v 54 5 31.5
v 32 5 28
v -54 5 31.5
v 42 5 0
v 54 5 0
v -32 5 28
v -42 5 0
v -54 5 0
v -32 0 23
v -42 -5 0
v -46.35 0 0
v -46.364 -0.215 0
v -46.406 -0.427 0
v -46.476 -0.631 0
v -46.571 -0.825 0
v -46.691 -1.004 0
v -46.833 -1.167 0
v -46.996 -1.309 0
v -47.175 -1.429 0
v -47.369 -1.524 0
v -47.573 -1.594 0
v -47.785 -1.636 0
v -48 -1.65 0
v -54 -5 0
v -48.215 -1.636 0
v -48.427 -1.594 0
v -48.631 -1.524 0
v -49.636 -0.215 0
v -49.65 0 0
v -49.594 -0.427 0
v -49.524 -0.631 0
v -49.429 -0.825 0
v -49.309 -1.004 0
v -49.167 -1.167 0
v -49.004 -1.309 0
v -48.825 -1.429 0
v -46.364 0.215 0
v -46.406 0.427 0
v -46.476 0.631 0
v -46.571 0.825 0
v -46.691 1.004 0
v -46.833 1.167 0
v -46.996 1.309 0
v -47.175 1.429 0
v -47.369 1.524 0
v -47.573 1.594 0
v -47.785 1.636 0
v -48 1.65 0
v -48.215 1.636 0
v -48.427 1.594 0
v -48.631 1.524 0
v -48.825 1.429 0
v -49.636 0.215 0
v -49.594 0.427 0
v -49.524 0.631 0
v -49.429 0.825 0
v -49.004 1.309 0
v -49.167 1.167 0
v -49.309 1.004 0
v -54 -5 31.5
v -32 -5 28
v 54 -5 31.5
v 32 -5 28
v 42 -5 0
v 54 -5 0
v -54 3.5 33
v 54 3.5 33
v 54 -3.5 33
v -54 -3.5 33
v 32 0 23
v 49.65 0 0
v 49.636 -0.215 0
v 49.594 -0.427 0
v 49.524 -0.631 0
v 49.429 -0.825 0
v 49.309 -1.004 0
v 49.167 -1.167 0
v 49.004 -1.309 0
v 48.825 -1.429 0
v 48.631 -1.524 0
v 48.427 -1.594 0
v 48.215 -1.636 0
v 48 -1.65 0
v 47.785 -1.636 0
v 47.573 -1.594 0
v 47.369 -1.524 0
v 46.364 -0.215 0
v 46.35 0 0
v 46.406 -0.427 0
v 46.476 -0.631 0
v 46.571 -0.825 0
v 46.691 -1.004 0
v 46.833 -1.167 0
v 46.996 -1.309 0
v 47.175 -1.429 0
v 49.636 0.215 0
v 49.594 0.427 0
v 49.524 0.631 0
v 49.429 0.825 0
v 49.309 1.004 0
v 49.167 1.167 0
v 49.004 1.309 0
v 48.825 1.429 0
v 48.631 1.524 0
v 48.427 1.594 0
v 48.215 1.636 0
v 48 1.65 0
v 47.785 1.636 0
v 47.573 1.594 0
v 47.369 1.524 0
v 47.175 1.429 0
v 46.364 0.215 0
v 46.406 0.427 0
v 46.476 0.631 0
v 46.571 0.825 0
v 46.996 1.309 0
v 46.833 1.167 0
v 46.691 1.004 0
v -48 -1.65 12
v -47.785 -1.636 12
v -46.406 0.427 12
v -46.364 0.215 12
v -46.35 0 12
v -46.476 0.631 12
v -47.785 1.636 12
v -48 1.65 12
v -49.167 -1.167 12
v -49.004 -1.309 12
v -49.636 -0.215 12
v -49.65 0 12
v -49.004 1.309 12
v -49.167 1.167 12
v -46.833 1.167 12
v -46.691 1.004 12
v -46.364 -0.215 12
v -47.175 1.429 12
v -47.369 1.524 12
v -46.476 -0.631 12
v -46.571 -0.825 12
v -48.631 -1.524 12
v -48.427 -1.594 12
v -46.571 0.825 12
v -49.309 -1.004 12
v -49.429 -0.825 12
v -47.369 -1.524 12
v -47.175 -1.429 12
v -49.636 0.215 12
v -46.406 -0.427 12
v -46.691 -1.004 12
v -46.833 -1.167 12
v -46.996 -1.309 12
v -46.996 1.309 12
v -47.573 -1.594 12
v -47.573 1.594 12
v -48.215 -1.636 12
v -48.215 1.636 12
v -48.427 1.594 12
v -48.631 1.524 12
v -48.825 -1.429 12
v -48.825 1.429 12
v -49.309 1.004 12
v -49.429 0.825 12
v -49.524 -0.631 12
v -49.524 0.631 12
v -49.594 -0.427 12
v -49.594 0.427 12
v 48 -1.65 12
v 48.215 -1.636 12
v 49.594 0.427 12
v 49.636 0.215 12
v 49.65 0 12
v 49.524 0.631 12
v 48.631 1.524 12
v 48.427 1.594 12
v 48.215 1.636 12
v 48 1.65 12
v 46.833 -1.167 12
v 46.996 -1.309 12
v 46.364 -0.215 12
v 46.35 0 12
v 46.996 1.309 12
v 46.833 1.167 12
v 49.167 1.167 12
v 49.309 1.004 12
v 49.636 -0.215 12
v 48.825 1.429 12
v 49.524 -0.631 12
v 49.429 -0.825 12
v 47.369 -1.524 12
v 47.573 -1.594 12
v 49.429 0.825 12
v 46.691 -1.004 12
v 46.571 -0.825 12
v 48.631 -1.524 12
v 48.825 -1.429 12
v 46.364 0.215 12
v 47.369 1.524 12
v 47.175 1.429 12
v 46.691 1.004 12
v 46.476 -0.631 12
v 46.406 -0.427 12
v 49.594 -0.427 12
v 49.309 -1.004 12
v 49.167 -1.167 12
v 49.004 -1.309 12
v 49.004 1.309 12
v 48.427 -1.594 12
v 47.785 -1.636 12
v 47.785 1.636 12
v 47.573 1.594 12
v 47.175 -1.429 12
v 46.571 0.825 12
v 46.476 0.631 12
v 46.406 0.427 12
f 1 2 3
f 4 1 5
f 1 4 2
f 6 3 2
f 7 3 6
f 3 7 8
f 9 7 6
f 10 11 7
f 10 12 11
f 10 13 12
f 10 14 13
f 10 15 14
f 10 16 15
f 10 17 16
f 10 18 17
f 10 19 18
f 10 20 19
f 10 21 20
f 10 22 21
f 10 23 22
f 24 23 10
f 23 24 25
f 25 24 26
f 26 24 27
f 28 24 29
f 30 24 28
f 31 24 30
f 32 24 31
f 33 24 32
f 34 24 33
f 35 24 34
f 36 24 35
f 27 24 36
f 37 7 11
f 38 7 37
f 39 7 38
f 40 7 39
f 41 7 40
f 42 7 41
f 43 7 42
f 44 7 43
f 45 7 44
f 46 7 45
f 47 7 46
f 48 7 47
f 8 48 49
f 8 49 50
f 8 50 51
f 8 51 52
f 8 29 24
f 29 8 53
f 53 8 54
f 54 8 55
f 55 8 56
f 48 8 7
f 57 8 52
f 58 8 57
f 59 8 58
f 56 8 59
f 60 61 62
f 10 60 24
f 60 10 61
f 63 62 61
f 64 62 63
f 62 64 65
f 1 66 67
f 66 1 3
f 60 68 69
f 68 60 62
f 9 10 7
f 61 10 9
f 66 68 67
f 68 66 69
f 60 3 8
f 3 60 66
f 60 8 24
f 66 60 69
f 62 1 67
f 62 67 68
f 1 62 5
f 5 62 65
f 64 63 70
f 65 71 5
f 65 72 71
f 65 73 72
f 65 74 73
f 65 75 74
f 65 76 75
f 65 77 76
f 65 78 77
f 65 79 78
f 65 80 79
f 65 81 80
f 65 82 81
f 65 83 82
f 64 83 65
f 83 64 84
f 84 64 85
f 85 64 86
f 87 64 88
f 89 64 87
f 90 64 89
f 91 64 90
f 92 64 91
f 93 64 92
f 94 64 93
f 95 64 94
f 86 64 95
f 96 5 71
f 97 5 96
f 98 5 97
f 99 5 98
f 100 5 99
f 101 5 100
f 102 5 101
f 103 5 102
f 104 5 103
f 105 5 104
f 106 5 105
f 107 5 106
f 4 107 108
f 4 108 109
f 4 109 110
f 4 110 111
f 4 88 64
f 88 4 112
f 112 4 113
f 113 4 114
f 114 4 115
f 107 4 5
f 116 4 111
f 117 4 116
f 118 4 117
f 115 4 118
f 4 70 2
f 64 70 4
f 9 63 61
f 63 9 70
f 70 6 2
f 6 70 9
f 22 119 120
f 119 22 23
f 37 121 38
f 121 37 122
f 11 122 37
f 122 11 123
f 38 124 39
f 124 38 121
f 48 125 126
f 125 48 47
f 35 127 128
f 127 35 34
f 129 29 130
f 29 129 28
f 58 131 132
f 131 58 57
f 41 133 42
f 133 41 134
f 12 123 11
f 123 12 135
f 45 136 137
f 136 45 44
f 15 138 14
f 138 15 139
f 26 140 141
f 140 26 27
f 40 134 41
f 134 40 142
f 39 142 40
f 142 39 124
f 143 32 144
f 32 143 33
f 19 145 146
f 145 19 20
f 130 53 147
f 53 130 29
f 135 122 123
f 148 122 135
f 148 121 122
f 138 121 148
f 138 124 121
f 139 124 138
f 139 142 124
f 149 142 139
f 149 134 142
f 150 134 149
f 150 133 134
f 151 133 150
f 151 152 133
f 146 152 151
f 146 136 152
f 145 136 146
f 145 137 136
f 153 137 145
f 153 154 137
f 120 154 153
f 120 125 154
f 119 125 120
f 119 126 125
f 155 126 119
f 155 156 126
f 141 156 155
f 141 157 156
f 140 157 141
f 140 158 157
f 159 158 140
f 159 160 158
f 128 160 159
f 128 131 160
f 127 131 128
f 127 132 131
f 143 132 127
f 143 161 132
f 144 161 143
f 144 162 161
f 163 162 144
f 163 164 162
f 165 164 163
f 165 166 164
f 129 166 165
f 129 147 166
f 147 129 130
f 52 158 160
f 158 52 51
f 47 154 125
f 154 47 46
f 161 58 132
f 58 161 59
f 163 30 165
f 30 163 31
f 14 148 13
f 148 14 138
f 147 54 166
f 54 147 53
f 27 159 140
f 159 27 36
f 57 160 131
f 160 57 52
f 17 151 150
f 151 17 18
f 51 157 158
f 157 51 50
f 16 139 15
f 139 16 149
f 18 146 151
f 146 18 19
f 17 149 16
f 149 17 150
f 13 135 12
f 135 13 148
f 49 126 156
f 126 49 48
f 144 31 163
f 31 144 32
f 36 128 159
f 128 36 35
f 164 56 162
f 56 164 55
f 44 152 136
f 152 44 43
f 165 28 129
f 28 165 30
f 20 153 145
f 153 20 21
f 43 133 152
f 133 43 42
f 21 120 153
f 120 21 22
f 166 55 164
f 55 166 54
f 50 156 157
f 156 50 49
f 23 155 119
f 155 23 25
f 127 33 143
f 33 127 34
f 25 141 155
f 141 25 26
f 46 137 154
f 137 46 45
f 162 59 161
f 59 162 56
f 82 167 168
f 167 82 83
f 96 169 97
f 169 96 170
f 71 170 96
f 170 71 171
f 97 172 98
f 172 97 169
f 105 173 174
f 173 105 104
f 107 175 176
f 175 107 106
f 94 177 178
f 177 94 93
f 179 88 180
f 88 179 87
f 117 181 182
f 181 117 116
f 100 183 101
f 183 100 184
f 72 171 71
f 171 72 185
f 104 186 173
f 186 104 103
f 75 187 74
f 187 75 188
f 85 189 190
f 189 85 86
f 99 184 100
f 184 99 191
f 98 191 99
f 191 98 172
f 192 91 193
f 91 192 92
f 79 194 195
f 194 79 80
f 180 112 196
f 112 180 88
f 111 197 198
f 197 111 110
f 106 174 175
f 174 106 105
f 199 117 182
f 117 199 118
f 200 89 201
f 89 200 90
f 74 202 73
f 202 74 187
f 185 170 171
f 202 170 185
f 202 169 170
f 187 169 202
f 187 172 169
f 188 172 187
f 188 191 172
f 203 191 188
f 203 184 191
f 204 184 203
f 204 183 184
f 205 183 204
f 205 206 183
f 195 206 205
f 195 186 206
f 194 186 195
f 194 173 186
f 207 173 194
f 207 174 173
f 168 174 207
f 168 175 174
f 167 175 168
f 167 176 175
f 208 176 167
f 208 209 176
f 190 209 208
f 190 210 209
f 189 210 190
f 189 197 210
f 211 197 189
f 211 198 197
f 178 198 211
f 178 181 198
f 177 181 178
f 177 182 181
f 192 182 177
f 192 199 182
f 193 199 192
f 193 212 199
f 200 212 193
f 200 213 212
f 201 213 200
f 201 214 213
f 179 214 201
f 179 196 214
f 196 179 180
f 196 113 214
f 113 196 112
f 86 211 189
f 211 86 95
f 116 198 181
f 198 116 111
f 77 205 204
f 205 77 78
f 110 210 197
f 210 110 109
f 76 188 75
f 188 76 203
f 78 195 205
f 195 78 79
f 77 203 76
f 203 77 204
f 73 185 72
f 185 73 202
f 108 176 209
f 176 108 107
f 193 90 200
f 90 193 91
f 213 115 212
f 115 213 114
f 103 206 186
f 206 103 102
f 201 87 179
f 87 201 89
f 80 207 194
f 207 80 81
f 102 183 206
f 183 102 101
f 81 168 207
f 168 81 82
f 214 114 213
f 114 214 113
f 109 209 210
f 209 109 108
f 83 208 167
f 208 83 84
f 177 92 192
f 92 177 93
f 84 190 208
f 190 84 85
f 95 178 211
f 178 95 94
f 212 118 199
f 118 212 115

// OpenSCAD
// Pull handle printed standing on its legs. The grip's underside is a
// 45 degree V, so the span between the legs starts as a single bridged line
// instead of a flat 10 mm wide bridge.
hole_spacing = 96;
grip_height = 33;
grip_diameter = 10;     // grip section: 10 wide, V underside, chamfered top
leg_width = 12;
tap_drill = 3.3;
hole_depth = 12;
v_tip = 23;             // lowest point of the grip, clear of the 20 mm bar
knee = 10;
$fn = 48;

x_out = hole_spacing/2 + leg_width/2;
x_in = hole_spacing/2 - leg_width/2;
w = grip_diameter/2;

module grip(x0, x1) {
    translate([x0, 0, 0]) rotate([90, 0, 90]) linear_extrude(x1 - x0)
        polygon([[0, v_tip], [w, v_tip + w], [w, grip_height - 1.5],
                 [w - 1.5, grip_height], [-w + 1.5, grip_height],
                 [-w, grip_height - 1.5], [-w, v_tip + w]]);
}

module leg(s) {
    hull() {
        translate([s > 0 ? x_in : -x_out, -w, 0]) cube([leg_width, 2*w, grip_height - 1.5]);
        if (s > 0) grip(x_in - knee, x_out); else grip(-x_out, -x_in + knee);
    }
}

difference() {
    union() {
        leg(-1);
        leg(1);
        grip(-x_in, x_in);
    }
    for (x = [-hole_spacing/2, hole_spacing/2])
        translate([x, 0, -1]) cylinder(d = tap_drill, h = hole_depth + 1);
}
